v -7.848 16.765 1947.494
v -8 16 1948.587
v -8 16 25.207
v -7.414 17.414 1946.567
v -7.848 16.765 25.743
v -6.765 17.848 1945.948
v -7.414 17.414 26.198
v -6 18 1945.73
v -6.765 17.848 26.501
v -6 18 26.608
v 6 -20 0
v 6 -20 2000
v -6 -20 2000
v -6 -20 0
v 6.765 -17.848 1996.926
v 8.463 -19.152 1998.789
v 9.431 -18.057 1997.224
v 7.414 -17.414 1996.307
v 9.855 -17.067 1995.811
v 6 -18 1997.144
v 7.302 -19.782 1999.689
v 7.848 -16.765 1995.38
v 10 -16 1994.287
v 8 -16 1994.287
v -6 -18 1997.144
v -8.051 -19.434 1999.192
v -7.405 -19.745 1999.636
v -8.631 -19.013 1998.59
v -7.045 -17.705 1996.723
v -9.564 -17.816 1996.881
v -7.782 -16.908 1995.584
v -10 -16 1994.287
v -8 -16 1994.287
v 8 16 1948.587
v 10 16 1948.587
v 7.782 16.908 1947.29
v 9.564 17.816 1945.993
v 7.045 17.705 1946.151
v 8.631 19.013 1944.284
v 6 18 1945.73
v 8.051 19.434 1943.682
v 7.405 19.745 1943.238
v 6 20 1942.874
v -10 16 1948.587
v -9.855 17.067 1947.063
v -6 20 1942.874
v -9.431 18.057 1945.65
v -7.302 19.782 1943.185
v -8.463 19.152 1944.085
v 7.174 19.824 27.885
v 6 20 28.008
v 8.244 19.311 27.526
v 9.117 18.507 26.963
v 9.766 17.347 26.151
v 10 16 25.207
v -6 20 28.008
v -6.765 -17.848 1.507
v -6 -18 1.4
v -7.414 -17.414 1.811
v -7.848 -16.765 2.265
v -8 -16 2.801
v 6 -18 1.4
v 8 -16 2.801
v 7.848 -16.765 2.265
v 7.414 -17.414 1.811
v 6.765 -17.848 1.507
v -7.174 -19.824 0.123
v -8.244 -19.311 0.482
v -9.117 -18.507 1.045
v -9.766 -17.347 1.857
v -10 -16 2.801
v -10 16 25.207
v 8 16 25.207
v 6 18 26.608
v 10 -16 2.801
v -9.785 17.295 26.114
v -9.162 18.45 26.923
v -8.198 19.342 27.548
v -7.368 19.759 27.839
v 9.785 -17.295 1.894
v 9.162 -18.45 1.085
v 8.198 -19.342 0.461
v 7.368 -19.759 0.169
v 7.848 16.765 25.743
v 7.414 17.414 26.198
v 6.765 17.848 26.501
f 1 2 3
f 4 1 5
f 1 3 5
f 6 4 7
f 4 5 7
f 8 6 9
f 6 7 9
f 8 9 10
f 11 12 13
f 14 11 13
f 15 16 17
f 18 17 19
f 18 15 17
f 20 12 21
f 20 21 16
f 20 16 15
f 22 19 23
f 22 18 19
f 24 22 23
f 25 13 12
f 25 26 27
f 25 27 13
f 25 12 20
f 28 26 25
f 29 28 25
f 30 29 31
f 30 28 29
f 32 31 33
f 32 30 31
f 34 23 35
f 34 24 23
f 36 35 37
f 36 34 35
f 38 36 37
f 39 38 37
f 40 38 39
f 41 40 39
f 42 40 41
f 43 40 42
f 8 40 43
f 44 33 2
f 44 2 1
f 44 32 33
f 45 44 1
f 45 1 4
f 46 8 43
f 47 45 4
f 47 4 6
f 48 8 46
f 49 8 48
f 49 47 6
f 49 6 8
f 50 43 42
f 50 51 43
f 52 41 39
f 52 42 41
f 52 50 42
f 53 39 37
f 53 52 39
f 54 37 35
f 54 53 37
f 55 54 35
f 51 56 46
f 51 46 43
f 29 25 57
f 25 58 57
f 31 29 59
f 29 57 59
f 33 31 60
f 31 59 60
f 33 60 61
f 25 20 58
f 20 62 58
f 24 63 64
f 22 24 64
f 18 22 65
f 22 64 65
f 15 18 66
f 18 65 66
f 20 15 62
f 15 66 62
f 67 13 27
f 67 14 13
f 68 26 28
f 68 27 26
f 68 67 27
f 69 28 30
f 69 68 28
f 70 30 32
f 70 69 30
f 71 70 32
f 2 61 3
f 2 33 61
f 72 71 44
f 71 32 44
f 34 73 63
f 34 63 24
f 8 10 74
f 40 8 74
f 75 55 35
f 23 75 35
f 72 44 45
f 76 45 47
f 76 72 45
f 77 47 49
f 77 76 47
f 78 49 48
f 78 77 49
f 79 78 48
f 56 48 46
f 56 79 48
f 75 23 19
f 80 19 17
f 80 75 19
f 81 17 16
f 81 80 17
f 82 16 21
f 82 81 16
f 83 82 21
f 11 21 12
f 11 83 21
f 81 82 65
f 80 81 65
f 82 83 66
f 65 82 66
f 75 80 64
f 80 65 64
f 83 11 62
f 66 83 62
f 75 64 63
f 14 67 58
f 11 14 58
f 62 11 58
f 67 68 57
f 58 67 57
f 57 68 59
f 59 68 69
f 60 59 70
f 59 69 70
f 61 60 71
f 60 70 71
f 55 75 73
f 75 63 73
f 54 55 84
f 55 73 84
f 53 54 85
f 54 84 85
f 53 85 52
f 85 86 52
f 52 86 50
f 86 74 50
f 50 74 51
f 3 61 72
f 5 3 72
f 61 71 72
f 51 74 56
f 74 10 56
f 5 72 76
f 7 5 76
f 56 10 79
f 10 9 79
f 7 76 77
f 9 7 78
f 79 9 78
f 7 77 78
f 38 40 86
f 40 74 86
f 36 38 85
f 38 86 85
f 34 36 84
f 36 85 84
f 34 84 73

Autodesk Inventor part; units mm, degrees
ref_plane "YZ Plane" through (0, 0, 0) normal (1, 0, 0) x (0, 1, 0)
ref_plane "Start plane" through (0, 0, 0) normal (0, 0, 1) x (1, 0, 0)
ref_plane "End plane" through (0, 0, 2000) normal (0, 0, 1) x (1, 0, 0)
sketch "Sketch" plane through (0, 0, 0) normal (0, 0, 1) x (1, 0, 0)
  line L0 (-10, -16) -> (-10, 16)
  line L1 (-6, 20) -> (6, 20)
  line L2 (10, 16) -> (10, -16)
  line L3 (6, -20) -> (-6, -20)
  arc A0 (-10, -16) -> (-6, -20) centre (-6, -16) ccw
  arc A1 (10, 16) -> (6, 20) centre (6, 16) ccw
  arc A2 (-6, 20) -> (-10, 16) centre (-6, 16) ccw
  arc A3 (6, -20) -> (10, -16) centre (6, -16) ccw
  arc A4 (-6, 18) -> (-8, 16) centre (-6, 16) ccw
  line L4 (-6, 18) -> (6, 18)
  arc A5 (8, 16) -> (6, 18) centre (6, 16) ccw
  line L5 (8, 16) -> (8, -16)
  arc A6 (6, -18) -> (8, -16) centre (6, -16) ccw
  line L6 (6, -18) -> (-6, -18)
  arc A7 (-8, -16) -> (-6, -18) centre (-6, -16) ccw
  line L7 (-8, -16) -> (-8, 16)
  line L8 (0, 29.1598) -> (0, -29.1598) construction
  line L9 (-15.1598, 0) -> (15.1598, 0) construction
  dimension "d7" = 4
  dimension "d9" = 20
  dimension "d11" = 40
  dimension "d12" = 2
  dimension "d15" = 10
  dimension "d16" = 20
extrude "Body" add sketch "Sketch" along normal up to surface (2000 mm away) from surface at 0
sketch "Sketch3" plane through (0, 0, 0) normal (0, 0, 1) x (1, 0, 0)
  line L0 (0, 0) -> (10, 0)
ref_plane "Work Plane3" through (0, 0, 0) normal (0, -1, 0) x (1, 0, 0)
sketch "Sketch5" plane through (0, 0, 0) normal (1, 0, 0) x (0, 1, 0)
  line L0 (-20, 0) -> (-20, 2000) projected
  line L1 (-20, 0) -> (-20, 2000) projected
  line L2 (20, 0) -> (20, 2000) projected
  line L3 (20, 0) -> (20, 2000) projected
  line L4 (-20, 0) -> (20, 0)
  line L5 (20, 2000) -> (-20, 2000)
  line L6 (-20, 2000) -> (20, 1942.8741)
  line L7 (-20, 0) -> (20, 28.0083)
  point P0 (0, 0)
  point P1 (20, 28.0083)
  point P2 (20, 1942.8741)
  dimension "d19" = 55
  dimension "d20" = 35
extrude "Extrusion2" cut sketch "Sketch5" along normal through all both and the other way through all contours L7 L2 L4 | L5 L2 L6
sketch "Sketch4" plane through (0, 0, 0) normal (0, -1, 0) x (1, 0, 0)
  line L0 (-2, 0) -> (12, 0) projected
  line L1 (-2, 2000) -> (12, 2000) projected
  dimension "d18" = 2000
equation "\"d7\" = G_IR"
equation "\"d9\" = G_W"
equation "\"d11\" = G_H"
equation "\"d12\" = G_T"
equation "\"d15\" = 0.5 * d9"
equation "\"d16\" = 0.5 * d11"
equation "\"d3\" = G_L"
equation "\"G_W\" = 20"
equation "\"G_H\" = 40"
equation "\"G_T\" = 2"
equation "\"G_IR\" = 4"
equation "\"G_L\" = d18"
equation "\"G_OFFSET_START\" = 0"
equation "\"G_OFFSET_END\" = 0"
properties part number "ISO 4019 - 40x20x2 - 2000" material "Steel, Mild"
